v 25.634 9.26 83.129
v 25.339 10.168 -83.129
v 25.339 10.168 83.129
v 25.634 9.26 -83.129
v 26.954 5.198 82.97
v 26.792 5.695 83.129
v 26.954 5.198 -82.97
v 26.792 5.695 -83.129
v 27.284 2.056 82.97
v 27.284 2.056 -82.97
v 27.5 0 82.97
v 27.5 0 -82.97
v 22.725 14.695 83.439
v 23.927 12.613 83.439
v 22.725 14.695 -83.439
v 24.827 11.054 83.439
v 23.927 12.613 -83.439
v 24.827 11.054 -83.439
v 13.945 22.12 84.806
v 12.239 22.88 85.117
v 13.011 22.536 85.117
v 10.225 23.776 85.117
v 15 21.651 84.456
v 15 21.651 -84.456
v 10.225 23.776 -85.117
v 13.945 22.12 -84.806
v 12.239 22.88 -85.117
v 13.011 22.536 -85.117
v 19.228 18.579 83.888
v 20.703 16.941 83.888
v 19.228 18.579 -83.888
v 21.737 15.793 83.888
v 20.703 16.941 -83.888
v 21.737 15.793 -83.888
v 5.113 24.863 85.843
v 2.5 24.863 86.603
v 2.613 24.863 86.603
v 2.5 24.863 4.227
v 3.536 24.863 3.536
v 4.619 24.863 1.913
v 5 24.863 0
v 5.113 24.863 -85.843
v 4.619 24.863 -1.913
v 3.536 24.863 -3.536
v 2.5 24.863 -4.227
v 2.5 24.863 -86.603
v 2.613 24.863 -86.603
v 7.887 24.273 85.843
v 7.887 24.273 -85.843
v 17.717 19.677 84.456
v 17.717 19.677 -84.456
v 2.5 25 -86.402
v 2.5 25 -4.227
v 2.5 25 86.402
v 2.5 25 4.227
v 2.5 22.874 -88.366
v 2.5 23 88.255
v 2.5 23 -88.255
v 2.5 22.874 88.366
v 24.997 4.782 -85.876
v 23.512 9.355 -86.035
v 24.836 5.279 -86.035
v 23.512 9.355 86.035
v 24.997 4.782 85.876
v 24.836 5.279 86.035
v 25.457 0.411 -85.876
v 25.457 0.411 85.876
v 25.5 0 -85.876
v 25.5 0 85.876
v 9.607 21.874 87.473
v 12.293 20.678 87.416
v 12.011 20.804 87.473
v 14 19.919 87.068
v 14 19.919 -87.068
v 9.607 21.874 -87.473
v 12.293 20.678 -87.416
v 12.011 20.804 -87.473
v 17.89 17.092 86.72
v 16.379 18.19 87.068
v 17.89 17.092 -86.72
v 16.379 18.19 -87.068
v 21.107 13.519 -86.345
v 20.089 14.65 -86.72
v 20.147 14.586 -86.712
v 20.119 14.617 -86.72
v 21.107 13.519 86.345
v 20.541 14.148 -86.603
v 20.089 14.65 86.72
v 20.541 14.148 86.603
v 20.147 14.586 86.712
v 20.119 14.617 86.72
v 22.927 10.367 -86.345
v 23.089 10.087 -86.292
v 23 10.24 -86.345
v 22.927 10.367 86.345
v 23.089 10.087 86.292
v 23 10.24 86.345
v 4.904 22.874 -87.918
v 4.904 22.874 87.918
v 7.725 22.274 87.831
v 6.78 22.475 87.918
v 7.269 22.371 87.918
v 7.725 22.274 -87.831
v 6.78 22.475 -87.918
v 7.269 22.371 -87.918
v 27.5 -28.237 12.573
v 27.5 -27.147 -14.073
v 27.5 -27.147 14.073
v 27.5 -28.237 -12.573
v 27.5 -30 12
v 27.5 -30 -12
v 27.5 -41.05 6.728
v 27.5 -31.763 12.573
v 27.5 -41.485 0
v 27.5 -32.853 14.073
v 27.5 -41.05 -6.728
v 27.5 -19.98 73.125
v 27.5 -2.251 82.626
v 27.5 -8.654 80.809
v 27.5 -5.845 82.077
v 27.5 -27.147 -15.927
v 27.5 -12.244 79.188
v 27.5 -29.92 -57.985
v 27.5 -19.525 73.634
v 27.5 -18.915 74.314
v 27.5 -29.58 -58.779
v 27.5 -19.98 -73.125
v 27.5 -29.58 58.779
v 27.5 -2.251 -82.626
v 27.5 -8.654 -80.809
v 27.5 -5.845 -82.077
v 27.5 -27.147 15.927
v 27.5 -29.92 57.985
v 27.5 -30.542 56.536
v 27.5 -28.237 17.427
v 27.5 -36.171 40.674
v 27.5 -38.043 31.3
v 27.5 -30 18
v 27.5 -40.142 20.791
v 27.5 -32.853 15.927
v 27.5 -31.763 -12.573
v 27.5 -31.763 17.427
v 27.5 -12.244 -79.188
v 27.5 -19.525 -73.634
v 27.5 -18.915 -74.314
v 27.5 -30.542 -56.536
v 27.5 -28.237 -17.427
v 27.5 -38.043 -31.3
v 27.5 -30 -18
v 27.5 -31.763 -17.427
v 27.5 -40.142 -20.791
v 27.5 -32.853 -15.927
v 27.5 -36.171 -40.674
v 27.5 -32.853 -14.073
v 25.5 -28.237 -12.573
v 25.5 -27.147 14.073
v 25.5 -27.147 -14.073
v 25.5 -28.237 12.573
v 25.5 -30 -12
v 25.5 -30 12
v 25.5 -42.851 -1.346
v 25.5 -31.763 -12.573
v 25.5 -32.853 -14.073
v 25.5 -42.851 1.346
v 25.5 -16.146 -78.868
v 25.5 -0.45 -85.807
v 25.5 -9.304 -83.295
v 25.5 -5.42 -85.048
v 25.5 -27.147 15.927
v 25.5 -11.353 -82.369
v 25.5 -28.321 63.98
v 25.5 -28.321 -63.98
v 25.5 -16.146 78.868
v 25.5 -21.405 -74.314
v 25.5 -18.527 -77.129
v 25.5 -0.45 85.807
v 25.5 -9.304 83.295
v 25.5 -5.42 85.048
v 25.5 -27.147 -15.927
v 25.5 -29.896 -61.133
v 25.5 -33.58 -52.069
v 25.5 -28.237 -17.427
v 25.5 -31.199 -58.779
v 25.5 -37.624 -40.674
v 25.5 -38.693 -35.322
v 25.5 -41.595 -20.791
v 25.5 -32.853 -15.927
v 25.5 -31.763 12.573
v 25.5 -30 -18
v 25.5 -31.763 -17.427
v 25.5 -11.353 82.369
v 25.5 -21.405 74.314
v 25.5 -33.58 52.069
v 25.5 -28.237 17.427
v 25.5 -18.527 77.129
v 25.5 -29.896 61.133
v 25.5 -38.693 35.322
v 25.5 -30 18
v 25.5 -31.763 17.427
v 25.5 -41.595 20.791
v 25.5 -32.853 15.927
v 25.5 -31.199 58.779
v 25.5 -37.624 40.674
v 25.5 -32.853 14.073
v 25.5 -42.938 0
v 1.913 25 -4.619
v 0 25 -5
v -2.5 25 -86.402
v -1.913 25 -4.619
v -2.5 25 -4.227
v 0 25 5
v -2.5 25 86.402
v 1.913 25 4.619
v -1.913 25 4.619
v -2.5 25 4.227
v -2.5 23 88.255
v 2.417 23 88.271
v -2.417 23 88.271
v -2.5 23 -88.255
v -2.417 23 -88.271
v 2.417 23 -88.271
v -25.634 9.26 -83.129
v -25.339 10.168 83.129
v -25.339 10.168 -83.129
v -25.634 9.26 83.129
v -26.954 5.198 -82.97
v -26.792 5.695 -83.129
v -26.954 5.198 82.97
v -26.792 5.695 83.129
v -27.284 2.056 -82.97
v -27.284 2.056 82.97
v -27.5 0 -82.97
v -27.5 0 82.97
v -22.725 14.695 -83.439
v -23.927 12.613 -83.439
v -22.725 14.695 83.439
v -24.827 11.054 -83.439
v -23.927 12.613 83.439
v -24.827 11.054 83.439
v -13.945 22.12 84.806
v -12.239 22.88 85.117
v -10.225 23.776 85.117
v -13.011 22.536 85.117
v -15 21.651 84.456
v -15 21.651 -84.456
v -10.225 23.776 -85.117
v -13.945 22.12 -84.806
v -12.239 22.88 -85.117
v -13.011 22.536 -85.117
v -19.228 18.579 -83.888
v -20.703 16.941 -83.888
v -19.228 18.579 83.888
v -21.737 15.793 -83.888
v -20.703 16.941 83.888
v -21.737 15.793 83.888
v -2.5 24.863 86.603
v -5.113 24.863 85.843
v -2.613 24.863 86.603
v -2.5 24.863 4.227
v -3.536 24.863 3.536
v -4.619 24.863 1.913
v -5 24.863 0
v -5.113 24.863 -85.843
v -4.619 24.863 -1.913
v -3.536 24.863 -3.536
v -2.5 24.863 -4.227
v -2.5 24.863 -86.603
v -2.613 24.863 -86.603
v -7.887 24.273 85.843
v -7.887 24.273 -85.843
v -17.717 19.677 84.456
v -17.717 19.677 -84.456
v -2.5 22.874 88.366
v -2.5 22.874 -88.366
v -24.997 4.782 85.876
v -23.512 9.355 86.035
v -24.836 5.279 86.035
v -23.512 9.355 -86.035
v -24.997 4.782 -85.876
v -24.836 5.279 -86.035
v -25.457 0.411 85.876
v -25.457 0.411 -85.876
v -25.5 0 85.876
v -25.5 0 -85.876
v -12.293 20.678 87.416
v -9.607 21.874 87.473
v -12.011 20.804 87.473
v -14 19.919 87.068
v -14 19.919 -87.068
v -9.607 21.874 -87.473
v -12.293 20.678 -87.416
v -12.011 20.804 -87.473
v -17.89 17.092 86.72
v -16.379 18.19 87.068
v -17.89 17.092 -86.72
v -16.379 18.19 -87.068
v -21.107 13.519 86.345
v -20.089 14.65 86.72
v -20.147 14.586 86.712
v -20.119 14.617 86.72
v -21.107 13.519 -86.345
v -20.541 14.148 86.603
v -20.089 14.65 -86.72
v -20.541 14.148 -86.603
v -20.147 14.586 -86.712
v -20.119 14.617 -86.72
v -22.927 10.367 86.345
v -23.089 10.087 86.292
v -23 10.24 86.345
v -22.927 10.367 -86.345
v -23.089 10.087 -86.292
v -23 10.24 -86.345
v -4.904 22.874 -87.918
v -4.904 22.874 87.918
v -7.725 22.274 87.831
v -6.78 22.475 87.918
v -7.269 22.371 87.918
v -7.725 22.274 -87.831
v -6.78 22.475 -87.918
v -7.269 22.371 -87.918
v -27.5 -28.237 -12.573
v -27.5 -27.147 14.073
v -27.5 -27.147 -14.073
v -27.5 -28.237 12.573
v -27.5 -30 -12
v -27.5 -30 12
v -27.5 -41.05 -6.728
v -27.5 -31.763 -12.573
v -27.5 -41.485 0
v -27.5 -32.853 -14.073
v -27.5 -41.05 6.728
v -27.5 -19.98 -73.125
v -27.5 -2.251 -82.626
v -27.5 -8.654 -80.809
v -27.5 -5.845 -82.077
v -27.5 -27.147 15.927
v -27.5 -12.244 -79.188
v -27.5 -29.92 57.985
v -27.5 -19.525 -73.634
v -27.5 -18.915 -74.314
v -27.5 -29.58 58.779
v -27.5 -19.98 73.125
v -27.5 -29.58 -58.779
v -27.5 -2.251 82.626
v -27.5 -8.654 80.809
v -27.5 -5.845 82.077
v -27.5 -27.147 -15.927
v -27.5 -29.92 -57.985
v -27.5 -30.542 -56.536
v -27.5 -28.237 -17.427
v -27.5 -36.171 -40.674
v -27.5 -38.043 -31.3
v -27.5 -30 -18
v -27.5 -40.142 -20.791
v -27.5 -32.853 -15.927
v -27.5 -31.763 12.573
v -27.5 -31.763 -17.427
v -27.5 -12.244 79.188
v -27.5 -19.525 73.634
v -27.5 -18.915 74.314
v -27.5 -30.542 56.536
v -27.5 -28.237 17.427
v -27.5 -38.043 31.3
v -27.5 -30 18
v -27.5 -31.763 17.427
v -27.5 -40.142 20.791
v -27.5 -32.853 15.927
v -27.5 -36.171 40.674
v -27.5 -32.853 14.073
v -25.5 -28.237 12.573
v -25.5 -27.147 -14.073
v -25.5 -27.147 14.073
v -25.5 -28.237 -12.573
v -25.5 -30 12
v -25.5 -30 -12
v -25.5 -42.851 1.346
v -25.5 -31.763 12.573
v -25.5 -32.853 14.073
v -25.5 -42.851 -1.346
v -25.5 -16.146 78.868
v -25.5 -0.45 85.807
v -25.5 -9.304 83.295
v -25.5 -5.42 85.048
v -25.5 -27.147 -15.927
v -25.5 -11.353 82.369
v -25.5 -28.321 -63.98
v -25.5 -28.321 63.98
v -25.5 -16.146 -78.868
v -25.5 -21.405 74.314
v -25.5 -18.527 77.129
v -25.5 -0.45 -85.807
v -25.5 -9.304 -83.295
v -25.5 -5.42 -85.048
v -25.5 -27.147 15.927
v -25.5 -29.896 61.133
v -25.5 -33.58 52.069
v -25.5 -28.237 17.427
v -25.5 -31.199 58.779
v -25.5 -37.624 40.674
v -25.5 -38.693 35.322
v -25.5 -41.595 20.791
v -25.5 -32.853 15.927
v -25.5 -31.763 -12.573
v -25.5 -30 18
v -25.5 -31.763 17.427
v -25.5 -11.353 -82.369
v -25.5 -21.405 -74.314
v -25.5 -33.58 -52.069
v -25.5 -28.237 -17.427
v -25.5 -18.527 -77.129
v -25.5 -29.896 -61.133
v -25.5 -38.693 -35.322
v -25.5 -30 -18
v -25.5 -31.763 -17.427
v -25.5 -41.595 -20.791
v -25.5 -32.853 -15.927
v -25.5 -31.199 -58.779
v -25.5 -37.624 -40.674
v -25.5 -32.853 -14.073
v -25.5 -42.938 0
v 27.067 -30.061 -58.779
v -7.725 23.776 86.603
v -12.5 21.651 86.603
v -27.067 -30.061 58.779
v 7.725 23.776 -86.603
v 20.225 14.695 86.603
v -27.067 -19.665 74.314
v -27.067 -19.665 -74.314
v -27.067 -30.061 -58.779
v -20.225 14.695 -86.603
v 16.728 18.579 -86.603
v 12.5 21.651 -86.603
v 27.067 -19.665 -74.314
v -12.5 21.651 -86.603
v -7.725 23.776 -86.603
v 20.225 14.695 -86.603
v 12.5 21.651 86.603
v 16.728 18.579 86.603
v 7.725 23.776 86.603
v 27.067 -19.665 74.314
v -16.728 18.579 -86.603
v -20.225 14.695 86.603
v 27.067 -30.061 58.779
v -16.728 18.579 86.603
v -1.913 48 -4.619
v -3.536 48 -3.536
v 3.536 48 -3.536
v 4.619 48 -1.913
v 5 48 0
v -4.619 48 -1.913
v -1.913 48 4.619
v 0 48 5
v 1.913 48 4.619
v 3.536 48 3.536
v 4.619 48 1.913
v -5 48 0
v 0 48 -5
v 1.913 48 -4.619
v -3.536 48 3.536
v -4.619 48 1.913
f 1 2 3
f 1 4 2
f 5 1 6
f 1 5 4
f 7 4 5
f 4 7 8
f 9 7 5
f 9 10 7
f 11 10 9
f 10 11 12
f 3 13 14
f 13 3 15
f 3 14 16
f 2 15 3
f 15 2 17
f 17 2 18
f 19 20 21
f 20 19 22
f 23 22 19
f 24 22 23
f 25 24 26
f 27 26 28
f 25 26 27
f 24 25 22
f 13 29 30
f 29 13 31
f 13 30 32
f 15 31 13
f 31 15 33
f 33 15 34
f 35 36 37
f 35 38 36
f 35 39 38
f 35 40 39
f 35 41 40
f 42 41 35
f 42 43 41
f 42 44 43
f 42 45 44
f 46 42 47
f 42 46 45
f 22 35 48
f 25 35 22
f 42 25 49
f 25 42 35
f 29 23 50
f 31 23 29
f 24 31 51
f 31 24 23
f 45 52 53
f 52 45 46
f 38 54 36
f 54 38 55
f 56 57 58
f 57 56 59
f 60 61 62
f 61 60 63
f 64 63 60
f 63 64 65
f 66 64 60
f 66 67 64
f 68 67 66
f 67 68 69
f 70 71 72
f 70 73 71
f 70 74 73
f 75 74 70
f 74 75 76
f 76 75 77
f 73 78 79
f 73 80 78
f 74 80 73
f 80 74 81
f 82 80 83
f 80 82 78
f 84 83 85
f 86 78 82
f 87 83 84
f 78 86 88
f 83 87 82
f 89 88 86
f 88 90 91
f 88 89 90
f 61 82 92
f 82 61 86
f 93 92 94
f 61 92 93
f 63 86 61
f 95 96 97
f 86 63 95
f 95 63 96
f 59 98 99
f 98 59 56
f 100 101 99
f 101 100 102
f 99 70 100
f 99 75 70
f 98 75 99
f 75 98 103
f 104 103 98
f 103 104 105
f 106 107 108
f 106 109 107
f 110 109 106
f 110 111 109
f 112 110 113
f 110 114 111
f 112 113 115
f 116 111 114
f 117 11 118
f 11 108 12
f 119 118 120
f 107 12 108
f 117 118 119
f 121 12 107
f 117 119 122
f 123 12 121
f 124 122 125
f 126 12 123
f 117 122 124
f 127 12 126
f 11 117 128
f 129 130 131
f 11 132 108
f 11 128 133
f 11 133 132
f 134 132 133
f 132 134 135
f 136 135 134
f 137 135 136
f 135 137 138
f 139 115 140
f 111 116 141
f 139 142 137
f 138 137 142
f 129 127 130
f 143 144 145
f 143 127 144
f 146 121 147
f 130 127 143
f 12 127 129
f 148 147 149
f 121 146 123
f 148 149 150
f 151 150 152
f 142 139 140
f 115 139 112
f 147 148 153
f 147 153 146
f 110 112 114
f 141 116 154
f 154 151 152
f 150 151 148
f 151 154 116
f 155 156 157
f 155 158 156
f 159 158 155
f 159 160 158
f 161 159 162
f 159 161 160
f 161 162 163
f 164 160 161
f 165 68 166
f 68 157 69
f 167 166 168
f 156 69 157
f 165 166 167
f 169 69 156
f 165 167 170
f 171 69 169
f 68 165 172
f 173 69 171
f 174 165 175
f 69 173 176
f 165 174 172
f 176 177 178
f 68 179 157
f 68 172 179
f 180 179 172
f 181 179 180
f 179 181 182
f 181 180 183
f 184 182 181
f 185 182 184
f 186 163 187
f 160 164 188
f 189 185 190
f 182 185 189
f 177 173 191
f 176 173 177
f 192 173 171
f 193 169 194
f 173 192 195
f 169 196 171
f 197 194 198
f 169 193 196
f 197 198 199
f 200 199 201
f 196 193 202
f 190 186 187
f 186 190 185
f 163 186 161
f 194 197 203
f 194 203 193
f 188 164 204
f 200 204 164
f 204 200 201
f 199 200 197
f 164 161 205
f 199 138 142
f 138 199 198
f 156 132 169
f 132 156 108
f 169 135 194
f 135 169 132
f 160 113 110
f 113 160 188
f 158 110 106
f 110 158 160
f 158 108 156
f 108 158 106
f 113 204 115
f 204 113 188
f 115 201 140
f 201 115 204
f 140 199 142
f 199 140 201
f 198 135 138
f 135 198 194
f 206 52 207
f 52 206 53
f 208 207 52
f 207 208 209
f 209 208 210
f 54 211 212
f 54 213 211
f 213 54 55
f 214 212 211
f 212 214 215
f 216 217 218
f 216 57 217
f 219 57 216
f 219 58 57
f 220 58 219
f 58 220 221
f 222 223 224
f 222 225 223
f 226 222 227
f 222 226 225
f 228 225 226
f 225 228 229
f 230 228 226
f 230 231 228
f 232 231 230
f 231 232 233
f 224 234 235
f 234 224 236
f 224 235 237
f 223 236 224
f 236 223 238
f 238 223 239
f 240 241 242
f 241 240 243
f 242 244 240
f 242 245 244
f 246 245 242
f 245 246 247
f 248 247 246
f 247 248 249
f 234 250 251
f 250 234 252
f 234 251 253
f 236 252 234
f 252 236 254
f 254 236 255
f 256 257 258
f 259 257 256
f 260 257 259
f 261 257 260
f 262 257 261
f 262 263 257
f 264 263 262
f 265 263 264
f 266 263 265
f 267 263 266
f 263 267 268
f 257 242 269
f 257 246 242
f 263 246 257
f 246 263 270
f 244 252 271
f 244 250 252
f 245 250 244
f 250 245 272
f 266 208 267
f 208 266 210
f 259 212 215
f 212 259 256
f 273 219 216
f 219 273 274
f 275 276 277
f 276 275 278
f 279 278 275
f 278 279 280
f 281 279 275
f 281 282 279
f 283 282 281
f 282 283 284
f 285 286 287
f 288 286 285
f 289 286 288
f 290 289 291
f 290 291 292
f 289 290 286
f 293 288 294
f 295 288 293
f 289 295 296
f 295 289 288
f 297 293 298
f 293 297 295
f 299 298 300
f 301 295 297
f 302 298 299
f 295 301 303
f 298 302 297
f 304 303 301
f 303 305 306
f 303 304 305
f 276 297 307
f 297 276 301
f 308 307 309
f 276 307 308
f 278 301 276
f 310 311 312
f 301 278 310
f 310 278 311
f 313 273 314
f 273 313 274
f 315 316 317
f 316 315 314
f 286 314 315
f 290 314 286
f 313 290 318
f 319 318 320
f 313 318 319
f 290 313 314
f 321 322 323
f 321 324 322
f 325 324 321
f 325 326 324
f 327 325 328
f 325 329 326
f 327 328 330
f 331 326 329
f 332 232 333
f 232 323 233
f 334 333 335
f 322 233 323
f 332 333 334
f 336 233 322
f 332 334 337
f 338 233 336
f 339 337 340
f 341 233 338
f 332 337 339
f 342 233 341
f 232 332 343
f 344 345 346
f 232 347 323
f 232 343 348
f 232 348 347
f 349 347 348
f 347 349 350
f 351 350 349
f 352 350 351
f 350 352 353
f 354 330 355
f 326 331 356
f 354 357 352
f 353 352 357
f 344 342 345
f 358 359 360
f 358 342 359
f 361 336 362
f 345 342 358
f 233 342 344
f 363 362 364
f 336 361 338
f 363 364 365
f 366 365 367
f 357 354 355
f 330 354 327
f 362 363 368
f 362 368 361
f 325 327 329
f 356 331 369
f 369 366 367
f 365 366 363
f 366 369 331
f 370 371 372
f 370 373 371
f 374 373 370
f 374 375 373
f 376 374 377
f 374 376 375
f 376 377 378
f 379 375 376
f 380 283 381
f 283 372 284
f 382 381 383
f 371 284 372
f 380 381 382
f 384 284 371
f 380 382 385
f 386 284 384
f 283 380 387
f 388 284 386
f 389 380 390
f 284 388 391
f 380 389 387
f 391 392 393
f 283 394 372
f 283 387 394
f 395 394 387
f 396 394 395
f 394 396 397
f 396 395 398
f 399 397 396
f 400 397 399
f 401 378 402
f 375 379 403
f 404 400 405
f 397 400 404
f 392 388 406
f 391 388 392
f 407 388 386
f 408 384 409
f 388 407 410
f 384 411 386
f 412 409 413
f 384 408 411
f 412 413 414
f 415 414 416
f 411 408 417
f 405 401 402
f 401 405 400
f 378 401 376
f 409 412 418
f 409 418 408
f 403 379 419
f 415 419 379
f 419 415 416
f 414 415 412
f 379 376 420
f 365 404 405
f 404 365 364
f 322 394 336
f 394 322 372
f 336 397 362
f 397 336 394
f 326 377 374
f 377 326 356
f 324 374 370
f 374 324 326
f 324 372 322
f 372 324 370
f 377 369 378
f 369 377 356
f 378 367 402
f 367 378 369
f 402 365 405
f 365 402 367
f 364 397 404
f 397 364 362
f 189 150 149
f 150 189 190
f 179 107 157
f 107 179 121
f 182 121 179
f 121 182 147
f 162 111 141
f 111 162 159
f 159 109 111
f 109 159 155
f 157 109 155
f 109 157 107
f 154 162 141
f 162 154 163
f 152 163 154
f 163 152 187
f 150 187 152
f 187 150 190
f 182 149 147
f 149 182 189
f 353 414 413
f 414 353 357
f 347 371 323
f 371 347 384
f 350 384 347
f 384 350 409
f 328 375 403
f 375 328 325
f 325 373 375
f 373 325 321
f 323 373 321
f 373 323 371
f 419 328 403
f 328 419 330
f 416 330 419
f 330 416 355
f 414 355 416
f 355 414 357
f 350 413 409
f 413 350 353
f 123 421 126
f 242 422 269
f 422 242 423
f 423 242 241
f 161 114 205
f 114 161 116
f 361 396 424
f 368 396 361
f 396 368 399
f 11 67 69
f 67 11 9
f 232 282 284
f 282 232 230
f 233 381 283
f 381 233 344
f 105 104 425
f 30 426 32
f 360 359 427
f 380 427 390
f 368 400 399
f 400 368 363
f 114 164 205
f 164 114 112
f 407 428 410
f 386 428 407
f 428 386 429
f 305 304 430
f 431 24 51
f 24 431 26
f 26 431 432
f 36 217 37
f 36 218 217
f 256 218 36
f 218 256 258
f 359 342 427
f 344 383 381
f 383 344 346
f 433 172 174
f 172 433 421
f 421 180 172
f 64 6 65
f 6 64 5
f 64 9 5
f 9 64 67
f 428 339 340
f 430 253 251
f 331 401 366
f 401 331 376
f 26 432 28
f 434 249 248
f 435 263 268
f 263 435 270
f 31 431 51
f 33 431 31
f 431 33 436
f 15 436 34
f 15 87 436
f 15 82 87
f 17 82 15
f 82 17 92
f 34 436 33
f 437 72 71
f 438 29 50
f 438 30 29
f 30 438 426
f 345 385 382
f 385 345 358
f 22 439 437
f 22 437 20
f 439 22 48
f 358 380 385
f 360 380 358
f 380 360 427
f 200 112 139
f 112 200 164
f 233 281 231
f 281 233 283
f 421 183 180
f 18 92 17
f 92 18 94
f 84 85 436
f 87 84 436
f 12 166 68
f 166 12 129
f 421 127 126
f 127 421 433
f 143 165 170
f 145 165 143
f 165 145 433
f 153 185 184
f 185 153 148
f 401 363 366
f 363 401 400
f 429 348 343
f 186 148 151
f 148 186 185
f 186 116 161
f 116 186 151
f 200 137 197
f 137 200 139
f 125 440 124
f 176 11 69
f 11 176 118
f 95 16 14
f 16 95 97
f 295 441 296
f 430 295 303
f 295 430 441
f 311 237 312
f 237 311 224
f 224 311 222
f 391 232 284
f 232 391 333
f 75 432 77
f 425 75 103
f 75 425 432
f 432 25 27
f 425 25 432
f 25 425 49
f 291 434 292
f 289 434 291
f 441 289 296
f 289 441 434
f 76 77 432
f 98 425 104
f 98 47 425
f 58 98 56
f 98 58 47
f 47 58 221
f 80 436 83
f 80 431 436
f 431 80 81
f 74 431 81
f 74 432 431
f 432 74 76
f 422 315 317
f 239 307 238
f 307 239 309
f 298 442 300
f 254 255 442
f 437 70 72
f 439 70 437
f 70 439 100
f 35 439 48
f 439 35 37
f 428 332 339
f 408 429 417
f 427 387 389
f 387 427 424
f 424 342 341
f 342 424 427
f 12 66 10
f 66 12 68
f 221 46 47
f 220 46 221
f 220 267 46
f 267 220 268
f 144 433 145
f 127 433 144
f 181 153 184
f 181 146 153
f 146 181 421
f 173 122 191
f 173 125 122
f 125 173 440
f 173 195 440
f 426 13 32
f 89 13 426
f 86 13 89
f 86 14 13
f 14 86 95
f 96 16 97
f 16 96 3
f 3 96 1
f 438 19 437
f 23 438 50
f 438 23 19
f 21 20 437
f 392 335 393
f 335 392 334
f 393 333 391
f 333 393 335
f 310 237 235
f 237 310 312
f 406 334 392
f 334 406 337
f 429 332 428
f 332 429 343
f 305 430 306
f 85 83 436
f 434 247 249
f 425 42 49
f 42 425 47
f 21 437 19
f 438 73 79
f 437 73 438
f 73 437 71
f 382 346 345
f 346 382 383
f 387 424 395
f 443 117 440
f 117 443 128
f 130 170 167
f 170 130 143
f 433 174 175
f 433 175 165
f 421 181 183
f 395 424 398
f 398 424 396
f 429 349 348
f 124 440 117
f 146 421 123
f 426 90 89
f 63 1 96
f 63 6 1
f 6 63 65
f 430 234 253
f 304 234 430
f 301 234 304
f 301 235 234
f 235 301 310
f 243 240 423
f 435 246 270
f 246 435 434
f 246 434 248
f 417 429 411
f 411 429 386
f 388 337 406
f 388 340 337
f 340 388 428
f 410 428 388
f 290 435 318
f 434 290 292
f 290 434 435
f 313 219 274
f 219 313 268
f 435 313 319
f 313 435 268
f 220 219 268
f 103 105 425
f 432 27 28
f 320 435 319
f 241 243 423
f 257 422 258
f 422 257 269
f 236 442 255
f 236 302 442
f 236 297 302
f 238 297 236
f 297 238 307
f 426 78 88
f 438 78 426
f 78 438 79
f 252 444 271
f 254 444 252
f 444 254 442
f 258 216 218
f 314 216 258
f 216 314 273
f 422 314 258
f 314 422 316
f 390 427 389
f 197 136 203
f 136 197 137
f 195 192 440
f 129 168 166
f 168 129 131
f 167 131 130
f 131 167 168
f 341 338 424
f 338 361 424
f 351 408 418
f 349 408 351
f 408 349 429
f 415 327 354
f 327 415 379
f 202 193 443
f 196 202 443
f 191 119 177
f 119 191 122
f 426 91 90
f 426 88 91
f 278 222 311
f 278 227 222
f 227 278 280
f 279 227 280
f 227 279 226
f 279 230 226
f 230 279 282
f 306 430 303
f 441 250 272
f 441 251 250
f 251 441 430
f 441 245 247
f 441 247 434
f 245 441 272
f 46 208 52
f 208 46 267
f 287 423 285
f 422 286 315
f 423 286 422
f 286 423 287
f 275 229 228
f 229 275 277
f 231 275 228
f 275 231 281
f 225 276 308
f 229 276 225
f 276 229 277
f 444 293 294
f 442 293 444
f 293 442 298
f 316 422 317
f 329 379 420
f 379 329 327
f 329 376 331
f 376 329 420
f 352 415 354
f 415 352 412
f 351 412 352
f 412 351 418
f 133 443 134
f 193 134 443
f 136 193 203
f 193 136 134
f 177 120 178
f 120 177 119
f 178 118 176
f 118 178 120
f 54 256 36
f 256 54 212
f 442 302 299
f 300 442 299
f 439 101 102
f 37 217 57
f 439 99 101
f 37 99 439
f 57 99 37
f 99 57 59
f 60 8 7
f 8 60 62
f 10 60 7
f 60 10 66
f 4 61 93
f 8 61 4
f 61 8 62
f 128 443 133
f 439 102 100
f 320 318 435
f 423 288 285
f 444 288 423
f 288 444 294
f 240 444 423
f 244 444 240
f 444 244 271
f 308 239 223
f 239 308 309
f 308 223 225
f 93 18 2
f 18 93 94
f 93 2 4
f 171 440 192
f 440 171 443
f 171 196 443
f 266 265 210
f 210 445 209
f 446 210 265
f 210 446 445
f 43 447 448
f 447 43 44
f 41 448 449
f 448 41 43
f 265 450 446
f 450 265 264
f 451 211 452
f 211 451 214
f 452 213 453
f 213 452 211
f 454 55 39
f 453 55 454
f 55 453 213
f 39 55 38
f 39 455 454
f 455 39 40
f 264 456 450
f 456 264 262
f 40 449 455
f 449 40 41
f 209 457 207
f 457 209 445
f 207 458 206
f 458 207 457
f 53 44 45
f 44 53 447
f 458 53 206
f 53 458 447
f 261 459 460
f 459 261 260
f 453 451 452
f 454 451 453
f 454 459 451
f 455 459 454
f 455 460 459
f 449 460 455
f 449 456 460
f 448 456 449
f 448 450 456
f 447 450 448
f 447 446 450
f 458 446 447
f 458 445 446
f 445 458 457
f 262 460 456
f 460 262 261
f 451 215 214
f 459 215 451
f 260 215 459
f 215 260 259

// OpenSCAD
thickness = 2;
length = 100;
fork_inner_width = 55;
fork_thickness = 30;
arch_height = 25;
arch_radius = 25;
height = 50;

pin_diameter = 10;
pin_height = 25;
pin_hole_height = 10;
pin_hole_diameter = 6;

module half() {
   translate([fork_inner_width/2-arch_radius,0,0])
   difference() {
   intersection() {
        cylinder(h=length, r=arch_radius);
        cube([arch_radius,arch_radius,length]);
        }   
   translate([0,0,-1]) cylinder(h=length+2, r=arch_radius-thickness);
   
   }
   translate([0,arch_radius-thickness,0]) cube([fork_inner_width/2-arch_radius,thickness,length]);
   difference() {
   translate([fork_inner_width/2-thickness,-100,0]) cube([thickness,100,length]);
    translate([0,-height+20,fork_thickness/2]) rotate([0,90,0]) cylinder(d=6,h=100);
    }
 }

module pin() {
   #translate([0,arch_radius-thickness,0]) rotate([-90,0,0]) cylinder(d=pin_diameter, h=pin_height);
  }
  
 intersection() {
 union() {
     half();
     mirror([1,0,0]) half();
     mirror([0,0,1]) half();
     mirror([1,0,0]) mirror([0,0,1]) half();
}
scale([1,1,length/height])
sphere(r=height);
}

pin();
